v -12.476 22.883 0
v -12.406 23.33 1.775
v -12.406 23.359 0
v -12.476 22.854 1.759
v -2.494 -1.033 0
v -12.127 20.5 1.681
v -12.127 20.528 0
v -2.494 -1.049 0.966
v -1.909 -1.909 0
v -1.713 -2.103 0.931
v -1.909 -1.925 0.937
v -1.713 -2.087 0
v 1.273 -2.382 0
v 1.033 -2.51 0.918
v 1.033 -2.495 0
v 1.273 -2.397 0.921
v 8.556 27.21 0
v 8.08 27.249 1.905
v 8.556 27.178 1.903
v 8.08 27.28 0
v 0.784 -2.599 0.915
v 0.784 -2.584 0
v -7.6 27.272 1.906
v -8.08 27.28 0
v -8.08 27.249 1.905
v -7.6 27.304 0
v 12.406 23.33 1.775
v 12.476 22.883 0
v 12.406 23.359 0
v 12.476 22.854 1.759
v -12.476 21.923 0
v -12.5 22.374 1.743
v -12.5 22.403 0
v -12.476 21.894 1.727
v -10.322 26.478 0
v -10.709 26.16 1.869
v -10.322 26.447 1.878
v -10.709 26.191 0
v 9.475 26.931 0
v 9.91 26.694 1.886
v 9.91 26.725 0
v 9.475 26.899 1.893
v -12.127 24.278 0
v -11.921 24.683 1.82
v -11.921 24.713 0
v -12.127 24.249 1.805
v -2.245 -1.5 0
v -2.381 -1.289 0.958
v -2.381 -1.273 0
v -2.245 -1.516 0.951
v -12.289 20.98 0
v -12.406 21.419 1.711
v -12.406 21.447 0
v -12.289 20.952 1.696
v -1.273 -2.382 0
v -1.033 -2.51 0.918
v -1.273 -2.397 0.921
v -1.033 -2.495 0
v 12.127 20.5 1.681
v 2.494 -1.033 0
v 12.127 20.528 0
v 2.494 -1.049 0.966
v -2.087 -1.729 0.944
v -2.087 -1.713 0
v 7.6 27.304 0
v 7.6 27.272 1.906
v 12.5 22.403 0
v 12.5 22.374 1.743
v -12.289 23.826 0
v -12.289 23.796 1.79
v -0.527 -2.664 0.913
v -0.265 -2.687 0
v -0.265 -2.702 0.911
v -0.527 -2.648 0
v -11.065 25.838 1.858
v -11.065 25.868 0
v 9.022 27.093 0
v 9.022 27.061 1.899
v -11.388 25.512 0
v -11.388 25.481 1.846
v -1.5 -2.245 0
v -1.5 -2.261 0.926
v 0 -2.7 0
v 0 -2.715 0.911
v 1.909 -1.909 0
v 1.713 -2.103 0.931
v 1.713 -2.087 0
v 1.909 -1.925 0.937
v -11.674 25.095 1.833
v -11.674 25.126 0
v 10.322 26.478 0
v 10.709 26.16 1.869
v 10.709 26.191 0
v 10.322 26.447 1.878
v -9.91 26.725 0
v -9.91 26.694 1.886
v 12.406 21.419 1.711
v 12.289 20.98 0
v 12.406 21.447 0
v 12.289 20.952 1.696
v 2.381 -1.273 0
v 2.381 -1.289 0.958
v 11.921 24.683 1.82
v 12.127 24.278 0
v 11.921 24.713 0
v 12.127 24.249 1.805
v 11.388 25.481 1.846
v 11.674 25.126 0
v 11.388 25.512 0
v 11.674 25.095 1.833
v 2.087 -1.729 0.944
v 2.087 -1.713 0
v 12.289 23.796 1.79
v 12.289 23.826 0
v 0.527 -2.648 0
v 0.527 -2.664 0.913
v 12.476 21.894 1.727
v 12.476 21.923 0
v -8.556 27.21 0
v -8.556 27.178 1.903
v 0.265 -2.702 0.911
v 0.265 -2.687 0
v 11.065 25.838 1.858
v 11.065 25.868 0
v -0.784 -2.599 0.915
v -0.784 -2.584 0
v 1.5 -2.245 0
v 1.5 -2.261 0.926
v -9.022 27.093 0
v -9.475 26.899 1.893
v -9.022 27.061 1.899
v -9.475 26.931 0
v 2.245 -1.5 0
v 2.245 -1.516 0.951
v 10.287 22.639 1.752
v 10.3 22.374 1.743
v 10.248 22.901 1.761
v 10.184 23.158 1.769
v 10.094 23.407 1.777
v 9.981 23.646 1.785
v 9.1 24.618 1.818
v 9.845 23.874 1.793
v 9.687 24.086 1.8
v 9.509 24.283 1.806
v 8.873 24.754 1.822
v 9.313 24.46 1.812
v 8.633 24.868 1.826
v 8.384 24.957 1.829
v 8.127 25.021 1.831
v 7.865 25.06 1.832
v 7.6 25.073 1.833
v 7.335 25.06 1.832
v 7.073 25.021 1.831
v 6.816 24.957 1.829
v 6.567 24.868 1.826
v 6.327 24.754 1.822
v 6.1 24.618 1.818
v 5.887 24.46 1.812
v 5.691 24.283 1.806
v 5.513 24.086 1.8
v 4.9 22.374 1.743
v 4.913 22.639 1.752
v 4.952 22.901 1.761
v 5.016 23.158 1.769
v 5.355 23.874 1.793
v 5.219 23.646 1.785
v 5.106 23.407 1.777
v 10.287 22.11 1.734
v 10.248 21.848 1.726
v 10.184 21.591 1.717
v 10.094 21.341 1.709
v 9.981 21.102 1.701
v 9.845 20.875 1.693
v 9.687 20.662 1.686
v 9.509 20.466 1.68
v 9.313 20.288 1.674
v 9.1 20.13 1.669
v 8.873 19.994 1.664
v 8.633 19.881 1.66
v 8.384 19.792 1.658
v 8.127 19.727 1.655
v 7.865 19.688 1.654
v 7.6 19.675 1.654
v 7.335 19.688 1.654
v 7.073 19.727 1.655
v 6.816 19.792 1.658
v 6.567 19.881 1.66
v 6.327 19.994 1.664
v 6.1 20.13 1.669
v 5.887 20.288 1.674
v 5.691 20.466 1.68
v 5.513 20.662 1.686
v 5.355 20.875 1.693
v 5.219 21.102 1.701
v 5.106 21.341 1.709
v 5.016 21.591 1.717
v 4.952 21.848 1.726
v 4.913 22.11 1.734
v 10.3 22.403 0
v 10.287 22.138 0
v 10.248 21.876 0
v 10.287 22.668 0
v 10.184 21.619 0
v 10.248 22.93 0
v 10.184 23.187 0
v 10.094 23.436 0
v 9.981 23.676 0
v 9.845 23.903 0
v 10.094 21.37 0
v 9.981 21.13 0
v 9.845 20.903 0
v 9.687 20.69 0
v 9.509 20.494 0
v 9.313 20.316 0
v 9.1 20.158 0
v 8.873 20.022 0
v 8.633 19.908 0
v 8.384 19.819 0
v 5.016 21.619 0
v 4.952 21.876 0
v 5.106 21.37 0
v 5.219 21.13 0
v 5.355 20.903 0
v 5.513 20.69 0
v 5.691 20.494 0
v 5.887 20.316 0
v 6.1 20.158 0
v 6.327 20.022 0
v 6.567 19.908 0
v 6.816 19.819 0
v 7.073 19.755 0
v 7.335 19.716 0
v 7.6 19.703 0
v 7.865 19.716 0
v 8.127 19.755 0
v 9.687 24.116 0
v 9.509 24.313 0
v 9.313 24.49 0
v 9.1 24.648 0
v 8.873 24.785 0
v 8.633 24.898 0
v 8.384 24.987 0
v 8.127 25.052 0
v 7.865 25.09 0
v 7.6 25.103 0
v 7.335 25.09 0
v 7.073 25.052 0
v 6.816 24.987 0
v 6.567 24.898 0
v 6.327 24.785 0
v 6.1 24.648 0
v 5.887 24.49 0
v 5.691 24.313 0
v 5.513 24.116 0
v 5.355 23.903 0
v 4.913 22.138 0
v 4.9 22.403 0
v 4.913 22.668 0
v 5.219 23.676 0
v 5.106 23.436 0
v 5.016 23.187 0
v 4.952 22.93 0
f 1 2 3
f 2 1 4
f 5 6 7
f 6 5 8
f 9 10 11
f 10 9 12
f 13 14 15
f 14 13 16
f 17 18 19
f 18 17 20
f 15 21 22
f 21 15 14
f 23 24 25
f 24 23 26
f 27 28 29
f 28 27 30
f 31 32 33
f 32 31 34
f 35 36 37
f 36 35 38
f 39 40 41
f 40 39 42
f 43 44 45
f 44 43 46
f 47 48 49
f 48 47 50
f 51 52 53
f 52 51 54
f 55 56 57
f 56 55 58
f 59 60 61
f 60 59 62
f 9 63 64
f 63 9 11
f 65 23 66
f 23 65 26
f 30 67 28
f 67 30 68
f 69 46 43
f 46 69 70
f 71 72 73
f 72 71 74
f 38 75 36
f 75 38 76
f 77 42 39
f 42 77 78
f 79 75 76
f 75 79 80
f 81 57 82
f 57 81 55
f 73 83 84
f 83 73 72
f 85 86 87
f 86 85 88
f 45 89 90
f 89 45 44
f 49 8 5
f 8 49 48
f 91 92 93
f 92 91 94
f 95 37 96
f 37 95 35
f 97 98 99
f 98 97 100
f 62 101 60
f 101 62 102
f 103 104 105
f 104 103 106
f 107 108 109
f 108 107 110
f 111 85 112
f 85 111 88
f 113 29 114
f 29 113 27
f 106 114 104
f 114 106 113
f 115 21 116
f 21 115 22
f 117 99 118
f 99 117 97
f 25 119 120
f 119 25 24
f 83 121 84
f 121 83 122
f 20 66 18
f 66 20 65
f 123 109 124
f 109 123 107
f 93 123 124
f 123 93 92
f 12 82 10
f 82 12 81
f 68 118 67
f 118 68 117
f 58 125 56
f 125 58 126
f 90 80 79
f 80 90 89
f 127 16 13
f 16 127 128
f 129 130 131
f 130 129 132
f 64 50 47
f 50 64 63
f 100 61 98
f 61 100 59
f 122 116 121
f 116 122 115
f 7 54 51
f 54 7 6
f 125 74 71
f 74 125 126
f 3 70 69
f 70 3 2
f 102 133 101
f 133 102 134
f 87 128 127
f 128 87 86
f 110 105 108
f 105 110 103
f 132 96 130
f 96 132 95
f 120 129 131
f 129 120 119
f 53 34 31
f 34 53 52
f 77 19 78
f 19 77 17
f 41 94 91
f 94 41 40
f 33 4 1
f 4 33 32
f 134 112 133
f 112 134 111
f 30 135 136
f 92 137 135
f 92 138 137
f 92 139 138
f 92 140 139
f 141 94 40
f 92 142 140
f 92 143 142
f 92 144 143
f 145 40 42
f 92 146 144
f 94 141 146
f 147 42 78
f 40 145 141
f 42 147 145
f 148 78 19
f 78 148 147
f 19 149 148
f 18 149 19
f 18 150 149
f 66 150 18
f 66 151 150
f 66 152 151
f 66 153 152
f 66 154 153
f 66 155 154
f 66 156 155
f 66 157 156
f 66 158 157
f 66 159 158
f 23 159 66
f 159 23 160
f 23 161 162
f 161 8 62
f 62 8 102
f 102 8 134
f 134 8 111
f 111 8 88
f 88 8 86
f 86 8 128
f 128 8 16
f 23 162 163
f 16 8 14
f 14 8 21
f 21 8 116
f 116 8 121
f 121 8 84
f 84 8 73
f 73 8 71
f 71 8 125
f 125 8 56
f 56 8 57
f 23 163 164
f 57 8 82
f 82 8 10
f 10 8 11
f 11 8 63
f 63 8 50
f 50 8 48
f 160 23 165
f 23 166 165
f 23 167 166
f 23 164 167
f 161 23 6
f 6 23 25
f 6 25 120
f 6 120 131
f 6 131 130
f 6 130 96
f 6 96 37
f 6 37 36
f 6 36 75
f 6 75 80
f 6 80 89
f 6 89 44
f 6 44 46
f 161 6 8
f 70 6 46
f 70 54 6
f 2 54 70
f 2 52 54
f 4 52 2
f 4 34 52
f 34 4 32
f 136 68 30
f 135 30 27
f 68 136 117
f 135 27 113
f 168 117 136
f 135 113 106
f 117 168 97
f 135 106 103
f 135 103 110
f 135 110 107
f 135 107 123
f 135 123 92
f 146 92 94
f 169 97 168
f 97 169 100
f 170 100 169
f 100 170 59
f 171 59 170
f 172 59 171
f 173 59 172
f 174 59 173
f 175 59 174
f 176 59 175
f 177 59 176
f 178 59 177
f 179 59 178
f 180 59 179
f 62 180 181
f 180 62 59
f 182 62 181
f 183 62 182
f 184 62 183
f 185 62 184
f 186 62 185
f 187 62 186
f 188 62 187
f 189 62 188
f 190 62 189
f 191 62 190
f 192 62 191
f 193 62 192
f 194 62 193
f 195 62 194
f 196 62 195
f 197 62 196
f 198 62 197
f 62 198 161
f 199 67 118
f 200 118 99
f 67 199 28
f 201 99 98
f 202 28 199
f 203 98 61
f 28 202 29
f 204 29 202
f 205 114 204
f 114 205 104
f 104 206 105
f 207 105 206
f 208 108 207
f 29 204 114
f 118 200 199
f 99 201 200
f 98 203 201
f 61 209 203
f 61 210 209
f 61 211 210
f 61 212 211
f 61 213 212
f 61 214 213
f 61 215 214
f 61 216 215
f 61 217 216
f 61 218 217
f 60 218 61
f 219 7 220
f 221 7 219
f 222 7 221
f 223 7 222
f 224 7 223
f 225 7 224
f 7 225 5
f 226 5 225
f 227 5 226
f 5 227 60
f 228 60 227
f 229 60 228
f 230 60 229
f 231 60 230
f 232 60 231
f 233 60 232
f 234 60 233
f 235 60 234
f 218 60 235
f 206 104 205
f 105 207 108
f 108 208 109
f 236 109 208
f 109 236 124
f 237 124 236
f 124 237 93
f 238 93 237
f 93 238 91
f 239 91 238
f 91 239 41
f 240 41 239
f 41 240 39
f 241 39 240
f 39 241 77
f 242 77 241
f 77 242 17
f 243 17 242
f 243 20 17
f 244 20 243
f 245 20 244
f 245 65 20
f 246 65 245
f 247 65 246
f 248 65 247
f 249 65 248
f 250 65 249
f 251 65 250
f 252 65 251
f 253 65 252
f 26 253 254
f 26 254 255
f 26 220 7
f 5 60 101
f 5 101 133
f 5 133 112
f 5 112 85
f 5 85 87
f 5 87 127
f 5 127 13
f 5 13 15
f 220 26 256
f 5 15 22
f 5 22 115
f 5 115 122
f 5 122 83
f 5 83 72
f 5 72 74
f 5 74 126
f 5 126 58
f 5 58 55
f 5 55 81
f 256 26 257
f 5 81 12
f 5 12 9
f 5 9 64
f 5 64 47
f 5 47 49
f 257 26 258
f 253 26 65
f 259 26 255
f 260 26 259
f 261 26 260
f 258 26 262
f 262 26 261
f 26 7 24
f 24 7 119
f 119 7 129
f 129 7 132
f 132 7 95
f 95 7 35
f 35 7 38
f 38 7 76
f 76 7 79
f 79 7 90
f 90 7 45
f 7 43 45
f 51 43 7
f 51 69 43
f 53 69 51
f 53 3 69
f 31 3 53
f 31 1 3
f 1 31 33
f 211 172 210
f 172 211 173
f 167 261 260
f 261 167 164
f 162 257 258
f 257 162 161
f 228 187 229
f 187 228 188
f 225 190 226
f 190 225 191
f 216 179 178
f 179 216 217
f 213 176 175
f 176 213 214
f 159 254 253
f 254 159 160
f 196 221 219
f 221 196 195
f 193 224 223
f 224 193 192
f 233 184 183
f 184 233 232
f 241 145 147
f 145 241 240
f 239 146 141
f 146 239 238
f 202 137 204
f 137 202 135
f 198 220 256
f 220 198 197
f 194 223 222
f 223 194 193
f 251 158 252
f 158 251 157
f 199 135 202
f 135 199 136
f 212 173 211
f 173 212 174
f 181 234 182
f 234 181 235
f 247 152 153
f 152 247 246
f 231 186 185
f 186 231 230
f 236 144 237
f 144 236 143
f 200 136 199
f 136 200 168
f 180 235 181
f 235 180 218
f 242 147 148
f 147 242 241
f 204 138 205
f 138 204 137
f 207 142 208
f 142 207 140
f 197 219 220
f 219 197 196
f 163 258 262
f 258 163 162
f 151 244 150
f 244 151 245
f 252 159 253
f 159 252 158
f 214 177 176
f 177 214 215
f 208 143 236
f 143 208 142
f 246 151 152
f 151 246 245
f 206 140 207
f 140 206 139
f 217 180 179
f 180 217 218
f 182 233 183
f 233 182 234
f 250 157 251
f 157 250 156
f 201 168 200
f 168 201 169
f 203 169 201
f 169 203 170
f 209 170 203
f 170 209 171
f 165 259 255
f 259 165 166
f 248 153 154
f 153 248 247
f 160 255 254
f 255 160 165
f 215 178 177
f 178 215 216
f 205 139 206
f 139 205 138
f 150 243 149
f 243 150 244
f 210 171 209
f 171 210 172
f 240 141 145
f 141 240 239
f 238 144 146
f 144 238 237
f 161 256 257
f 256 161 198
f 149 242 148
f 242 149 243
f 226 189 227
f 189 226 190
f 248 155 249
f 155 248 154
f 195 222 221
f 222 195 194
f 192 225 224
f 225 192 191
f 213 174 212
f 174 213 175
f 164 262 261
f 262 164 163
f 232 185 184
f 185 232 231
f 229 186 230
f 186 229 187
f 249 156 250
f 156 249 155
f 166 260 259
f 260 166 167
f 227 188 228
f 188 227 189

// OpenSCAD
// [FL_INDEX: keywords="openscad, 3d_parametric, Customizable_Plectrum___guitar__pick, csg_solid" | COT="Parametric OpenSCAD design from 3DCodeverse"]
// Title: Customizable Plectrum ([guitar] pick)

// customizable plectrum

tip_radius=2.7;
hip_radius=4.9;
width=25;
length=30;
bevel=.95;
tip_height=1;
hole="yes"; //[yes,no]
hole_radius=2.7;
resolution=64;

height=7;
// actual height of final object is determined by tip height and bevel angle.  
// if height variable is too low, there will be flats at the thick parts, 
// and the final object will not sit flat on the build platform.

$fn=resolution;

//place flat at origin
rotate ([bevel, 0, 0])
translate ([0, 0, tip_height/2-height/2])

difference(){
hull (){
cylinder (r=tip_radius, h=height);
translate ([-width/2+hip_radius, length-hip_radius-tip_radius, 0])
 cylinder (r=hip_radius, h=height);
translate ([width/2-hip_radius, length-hip_radius-tip_radius,0])
 cylinder (r=hip_radius, h=height);
 }

//cut top and bottom faces
rotate ([bevel, 0, 0])
 translate ([-width/2-1, -tip_radius-1, height/2+tip_height/2])
  cube ([width+2, length+2, height/2]);
rotate ([-bevel, 0, 0])
 translate ([-width/2-1, -tip_radius-1, -tip_height/2])
  cube ([width+2, length+2, height/2]);

//optional hole
if (hole=="yes"){
translate ([width/2-hip_radius, length-hip_radius-tip_radius, 0])
 cylinder (r=hole_radius, h=height);}
}
